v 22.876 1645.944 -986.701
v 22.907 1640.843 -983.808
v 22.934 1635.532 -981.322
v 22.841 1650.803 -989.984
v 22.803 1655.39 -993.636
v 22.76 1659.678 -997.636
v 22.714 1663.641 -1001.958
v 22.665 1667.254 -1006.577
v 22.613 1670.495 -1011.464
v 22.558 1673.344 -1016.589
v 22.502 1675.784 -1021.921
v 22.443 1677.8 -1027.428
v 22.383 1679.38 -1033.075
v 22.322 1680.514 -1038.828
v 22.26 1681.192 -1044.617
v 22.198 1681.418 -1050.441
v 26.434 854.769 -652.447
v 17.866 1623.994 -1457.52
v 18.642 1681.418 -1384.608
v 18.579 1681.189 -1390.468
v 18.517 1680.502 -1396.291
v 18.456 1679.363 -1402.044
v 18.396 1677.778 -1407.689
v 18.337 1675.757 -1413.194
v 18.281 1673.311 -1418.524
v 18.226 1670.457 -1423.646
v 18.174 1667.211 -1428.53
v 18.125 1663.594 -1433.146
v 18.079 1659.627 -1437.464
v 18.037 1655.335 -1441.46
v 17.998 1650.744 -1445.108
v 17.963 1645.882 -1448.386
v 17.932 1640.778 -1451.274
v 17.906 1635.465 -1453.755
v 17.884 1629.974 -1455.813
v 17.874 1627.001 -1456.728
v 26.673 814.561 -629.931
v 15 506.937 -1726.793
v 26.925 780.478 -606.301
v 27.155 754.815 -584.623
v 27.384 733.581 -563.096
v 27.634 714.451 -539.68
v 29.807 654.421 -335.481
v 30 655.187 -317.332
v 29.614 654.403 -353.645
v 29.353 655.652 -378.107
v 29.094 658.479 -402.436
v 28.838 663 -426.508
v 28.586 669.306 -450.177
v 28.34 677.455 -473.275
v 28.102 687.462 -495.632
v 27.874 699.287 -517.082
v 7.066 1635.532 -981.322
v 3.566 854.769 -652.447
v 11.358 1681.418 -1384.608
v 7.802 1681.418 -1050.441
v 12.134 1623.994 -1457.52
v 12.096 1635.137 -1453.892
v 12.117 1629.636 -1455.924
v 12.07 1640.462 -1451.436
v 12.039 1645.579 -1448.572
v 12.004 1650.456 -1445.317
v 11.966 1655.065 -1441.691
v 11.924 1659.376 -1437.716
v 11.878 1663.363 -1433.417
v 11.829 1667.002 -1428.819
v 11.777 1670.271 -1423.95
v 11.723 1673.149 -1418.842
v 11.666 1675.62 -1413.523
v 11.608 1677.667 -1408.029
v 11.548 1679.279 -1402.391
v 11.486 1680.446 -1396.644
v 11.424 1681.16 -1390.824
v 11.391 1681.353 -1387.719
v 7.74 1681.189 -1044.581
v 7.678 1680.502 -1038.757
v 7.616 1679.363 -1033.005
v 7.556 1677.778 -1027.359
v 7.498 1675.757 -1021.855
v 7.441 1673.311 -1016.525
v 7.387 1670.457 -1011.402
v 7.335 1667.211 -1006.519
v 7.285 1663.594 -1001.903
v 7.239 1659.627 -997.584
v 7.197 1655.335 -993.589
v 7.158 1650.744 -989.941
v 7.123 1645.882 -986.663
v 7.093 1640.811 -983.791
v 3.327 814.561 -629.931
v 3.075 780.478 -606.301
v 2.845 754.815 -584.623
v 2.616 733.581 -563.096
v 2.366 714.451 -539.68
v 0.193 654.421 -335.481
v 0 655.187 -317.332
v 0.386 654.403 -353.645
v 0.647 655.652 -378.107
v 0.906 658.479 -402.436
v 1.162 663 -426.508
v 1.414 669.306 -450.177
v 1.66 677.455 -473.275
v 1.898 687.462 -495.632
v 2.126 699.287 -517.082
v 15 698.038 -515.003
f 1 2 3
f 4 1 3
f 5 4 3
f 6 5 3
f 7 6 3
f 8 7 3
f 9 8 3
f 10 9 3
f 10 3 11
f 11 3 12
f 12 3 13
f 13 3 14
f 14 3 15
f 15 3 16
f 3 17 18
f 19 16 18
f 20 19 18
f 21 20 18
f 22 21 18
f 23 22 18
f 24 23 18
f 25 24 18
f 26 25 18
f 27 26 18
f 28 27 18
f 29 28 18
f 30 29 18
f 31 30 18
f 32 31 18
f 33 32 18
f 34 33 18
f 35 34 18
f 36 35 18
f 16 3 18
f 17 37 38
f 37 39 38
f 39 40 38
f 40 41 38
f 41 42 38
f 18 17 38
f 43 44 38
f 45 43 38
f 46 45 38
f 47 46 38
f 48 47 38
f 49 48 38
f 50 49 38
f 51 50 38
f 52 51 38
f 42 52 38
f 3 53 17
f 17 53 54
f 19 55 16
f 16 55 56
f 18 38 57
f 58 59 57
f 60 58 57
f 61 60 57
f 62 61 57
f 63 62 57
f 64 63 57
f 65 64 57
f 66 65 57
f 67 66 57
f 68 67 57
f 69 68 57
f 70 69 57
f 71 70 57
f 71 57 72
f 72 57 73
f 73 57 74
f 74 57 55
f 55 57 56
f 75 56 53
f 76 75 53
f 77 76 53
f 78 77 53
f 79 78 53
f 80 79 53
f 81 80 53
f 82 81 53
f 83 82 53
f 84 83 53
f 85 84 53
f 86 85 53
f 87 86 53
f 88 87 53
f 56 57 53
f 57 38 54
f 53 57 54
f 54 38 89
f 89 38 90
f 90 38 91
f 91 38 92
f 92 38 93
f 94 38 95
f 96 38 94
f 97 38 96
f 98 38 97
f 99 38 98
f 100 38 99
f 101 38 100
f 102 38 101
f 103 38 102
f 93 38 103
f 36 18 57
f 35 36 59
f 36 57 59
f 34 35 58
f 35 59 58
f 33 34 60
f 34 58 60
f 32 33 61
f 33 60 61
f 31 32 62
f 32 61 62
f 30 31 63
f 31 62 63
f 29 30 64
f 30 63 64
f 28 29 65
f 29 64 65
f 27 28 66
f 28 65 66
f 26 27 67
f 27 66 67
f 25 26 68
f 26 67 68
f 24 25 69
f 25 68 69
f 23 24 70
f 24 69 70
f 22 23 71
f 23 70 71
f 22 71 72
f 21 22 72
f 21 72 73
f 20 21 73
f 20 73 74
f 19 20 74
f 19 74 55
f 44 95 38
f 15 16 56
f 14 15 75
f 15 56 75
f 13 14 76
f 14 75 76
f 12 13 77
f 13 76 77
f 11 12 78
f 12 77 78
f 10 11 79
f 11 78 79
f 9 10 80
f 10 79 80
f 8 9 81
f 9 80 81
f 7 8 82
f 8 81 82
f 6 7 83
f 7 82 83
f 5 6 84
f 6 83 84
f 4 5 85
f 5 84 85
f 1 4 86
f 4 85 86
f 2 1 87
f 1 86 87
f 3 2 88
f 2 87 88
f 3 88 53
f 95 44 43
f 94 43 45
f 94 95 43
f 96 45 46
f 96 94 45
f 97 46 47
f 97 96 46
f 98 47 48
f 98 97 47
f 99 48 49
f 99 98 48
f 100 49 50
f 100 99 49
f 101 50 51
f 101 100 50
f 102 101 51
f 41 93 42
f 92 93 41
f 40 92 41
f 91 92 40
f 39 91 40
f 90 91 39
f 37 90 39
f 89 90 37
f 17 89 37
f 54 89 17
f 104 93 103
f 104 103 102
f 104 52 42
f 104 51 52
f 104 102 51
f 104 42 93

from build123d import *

# Parameters (mm, degrees)
BOSS_EXTRUDE2_DEPTH = 30
SKETCH2_OUTSIDE_W   = 398.982
SKETCH2_OUTSIDE_H   = 1778.443
CUT_EXTRUDE3_DEPTH  = 1682.417983347


with BuildPart() as part:
    # Sketch1 → Boss-Extrude2 (new body)
    with BuildSketch(Plane(origin=(0, 0, 0), x_dir=(0, 0, -1), z_dir=(1, 0, 0))):
        with BuildLine():
            add(Edge.make_bspline(
                [(317.332343648, 655.186668482), (545.117144099, 641.097671469), (652.446570925, 854.768900431)],
                knots=[0.084059477, 0.084059477, 0.084059477, 1, 1, 1], degree=2))
            Line((317.332343648, 655.186668482), (1726.792532284, 506.936901497))
            Line((1726.792532284, 506.936901497), (1457.519541354, 1623.993731145))
            ThreePointArc((1457.519541354, 1623.993731145), (1431.012841469, 1665.338188153), (1384.60799847, 1681.417983247))
            Line((1384.60799847, 1681.417983247), (1050.440765915, 1681.417983247))
            ThreePointArc((1050.440765915, 1681.417983247), (1008.959277853, 1668.902270457), (981.322333542, 1635.532280531))
            Line((981.322333542, 1635.532280531), (652.446570925, 854.768900431))
        make_face()
    extrude(amount=BOSS_EXTRUDE2_DEPTH)

    # Sketch2 outside → Cut-Extrude3 (cut, through all)
    with BuildSketch(Plane(origin=(0, 0, 0), x_dir=(1, 0, 0), z_dir=(0, 1, 0))):
        with Locations((15, 1022.0625)):
            Rectangle(SKETCH2_OUTSIDE_W, SKETCH2_OUTSIDE_H)
        Polygon((15, 1726.792532284), (0, 317.332343643), (30, 317.332343643), align=None, mode=Mode.SUBTRACT)
    extrude(amount=CUT_EXTRUDE3_DEPTH, mode=Mode.SUBTRACT)


solid = part.part
